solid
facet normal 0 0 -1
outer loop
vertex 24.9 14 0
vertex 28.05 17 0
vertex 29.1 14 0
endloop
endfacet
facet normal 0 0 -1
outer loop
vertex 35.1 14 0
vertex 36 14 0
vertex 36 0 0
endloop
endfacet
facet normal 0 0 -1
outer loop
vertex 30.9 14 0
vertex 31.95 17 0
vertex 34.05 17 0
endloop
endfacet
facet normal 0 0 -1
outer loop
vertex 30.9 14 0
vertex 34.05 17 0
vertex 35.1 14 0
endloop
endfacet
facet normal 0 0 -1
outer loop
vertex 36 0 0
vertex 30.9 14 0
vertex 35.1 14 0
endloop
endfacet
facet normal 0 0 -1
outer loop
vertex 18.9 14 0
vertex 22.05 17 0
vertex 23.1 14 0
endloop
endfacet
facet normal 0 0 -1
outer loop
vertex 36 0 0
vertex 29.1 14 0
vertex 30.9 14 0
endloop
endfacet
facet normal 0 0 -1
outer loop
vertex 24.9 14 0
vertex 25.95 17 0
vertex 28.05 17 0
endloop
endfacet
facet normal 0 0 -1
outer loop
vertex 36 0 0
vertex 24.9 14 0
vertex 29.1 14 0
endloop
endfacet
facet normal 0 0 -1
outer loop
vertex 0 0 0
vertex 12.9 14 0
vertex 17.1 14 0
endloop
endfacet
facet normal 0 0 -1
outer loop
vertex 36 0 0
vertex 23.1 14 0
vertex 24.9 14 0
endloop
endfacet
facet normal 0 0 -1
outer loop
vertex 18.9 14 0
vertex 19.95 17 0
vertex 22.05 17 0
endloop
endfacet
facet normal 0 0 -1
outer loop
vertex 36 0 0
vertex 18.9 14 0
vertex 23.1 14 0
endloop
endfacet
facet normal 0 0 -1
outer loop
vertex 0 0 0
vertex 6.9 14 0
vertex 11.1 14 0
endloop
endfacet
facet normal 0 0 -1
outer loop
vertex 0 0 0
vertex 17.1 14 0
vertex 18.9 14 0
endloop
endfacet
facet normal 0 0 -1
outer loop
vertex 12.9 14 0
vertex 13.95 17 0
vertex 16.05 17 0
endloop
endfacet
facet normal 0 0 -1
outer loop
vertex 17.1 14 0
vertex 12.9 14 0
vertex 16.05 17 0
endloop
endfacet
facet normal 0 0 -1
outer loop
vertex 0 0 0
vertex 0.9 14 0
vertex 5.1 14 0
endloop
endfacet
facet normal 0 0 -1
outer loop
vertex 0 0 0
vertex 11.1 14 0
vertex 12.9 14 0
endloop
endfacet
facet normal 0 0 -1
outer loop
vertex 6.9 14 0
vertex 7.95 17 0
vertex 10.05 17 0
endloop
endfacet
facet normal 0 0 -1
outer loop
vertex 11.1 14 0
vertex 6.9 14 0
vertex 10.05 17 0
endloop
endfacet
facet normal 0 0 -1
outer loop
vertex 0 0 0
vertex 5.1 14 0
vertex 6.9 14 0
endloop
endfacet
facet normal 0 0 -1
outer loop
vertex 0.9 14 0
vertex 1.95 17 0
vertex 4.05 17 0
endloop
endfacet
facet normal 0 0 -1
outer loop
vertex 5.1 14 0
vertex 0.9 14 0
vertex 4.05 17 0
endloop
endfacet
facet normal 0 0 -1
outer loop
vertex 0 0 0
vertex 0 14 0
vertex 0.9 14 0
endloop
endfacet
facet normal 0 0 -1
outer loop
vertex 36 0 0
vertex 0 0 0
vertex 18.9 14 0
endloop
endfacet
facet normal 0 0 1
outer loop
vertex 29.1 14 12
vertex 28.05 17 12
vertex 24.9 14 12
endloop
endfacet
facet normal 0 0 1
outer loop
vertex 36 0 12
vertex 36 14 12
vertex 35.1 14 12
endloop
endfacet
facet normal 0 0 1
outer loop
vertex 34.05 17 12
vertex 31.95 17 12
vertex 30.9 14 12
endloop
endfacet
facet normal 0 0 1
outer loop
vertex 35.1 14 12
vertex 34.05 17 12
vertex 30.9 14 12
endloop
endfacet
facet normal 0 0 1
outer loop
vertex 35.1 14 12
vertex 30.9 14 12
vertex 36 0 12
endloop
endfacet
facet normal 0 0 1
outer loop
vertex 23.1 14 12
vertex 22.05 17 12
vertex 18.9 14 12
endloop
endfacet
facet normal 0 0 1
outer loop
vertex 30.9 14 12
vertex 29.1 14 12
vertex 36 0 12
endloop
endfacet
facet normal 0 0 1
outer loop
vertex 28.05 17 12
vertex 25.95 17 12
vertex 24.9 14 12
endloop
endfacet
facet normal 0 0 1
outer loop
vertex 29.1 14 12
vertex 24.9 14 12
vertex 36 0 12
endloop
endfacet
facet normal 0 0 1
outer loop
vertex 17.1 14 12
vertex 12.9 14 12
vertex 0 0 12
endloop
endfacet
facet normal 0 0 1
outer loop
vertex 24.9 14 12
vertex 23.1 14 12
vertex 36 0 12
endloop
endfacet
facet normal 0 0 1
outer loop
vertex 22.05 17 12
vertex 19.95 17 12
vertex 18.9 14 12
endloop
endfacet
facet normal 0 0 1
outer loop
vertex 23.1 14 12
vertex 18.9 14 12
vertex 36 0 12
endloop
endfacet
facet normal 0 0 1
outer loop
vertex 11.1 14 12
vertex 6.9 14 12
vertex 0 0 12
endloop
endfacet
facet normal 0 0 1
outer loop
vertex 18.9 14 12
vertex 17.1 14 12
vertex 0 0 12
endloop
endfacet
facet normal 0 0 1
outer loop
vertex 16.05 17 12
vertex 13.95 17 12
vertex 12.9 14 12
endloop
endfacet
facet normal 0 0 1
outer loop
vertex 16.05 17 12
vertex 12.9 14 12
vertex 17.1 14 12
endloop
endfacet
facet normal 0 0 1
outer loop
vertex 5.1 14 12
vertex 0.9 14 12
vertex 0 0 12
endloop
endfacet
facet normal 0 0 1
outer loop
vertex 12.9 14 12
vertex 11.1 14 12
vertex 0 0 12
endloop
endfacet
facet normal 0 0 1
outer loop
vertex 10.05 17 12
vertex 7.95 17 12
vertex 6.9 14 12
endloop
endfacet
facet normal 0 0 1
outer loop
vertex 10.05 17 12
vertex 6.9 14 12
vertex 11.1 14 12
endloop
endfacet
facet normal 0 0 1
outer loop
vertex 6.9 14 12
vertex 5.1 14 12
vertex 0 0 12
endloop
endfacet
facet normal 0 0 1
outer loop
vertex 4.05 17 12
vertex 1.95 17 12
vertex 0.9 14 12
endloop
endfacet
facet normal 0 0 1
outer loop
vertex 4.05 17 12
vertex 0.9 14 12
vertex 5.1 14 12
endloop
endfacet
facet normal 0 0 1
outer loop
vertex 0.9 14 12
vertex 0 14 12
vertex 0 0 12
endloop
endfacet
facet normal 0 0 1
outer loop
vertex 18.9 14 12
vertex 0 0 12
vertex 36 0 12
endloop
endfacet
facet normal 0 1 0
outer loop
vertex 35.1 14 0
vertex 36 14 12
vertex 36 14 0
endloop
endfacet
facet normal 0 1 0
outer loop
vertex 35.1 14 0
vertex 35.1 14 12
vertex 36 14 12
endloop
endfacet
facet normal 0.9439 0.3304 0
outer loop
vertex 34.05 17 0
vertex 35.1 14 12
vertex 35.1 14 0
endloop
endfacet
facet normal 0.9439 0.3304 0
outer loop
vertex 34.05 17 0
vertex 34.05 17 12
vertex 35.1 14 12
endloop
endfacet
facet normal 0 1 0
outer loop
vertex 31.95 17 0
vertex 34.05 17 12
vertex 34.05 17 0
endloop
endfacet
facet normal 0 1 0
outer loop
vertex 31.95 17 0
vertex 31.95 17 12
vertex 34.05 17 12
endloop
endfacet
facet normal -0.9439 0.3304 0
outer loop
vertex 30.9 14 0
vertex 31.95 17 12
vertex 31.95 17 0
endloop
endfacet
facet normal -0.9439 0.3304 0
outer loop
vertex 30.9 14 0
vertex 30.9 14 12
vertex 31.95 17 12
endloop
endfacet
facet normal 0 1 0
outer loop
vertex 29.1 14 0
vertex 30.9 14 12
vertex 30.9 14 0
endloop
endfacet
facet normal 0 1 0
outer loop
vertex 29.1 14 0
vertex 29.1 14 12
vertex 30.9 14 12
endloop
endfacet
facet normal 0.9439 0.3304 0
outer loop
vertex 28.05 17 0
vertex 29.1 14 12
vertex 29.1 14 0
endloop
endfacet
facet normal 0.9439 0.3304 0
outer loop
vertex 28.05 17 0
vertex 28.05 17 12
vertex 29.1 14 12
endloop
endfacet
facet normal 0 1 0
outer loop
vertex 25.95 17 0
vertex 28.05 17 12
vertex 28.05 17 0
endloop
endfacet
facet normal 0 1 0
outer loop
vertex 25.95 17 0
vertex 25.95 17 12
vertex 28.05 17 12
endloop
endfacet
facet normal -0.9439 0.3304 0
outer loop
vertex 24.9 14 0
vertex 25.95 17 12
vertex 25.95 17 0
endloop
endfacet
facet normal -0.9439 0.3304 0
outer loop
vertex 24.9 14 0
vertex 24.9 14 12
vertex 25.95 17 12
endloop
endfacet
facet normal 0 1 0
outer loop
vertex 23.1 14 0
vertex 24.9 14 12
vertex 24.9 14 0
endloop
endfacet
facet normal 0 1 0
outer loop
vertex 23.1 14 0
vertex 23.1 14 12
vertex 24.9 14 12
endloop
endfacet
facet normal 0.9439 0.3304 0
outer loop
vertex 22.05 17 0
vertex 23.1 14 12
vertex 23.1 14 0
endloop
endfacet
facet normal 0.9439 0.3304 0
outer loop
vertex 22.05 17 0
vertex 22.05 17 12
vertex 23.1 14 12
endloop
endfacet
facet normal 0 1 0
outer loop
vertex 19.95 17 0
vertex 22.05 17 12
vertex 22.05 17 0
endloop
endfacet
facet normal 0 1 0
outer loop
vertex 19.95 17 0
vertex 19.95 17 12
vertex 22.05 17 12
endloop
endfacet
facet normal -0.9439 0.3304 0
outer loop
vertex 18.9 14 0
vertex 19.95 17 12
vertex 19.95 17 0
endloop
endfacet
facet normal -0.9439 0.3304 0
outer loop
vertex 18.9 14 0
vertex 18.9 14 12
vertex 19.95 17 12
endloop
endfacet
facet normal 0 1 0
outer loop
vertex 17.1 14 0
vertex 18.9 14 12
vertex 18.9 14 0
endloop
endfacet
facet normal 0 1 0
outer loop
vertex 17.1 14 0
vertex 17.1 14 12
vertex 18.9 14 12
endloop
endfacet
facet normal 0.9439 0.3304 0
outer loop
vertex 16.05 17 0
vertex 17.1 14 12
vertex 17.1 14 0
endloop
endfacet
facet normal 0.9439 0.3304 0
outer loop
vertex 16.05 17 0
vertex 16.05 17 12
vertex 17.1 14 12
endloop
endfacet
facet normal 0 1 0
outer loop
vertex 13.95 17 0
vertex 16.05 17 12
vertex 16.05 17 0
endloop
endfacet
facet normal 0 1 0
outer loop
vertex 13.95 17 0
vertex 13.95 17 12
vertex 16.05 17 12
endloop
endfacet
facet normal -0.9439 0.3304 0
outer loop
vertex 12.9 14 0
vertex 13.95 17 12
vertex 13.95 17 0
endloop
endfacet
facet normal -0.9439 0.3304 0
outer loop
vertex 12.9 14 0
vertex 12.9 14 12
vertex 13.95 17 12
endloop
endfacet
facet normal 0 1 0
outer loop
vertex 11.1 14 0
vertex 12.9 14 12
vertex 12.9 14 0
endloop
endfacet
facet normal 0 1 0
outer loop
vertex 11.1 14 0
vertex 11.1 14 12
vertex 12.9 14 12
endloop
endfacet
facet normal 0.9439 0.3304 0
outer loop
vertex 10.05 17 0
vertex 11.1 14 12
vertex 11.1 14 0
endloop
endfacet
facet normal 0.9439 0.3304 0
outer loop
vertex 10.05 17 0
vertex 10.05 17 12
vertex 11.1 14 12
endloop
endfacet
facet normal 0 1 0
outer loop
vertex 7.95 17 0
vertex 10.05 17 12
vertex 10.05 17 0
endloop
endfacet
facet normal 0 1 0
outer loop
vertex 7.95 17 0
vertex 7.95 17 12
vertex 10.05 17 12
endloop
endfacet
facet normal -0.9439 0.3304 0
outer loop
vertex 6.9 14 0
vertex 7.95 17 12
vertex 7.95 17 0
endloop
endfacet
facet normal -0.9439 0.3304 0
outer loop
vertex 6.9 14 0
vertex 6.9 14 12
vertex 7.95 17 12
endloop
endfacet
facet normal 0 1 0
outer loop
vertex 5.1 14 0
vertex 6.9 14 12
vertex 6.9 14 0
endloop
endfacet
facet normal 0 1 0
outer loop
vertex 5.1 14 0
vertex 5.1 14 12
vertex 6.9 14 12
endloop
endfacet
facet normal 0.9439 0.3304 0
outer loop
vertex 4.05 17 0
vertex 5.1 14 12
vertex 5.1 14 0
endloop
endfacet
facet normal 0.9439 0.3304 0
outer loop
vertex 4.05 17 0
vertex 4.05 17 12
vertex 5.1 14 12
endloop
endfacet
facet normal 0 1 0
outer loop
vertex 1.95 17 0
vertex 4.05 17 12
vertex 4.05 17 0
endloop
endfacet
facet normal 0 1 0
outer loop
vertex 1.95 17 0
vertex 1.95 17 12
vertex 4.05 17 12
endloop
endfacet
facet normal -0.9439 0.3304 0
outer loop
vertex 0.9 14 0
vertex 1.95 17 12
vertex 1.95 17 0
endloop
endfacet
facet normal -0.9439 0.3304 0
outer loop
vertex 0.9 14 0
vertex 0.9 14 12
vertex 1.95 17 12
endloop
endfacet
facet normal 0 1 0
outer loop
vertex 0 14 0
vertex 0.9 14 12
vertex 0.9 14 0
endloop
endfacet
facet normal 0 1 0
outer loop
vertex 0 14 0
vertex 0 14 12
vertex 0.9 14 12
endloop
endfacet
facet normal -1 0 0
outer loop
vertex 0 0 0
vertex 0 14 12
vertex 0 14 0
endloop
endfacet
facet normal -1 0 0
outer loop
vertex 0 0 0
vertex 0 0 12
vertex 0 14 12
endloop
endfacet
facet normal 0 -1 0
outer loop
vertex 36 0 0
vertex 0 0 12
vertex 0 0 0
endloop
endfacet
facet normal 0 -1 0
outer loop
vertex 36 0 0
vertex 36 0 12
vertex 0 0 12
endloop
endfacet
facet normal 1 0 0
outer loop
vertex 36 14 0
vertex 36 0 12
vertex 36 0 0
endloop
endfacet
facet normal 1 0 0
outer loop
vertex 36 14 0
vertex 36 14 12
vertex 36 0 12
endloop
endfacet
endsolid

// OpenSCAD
$fn = 32;

// ----------------------------------------------------------------------
// Gear rack: 6 teeth, pitch 6 mm
// ----------------------------------------------------------------------

// --- parameters (mm) ---
teeth = 6;                // number of teeth
pitch = 6;                // tooth pitch, X
root_w = 4.2;             // tooth width at the root
tip_w = 2.1;              // tooth width at the tip
base_h = 14;              // rack body height, Y
tooth_h = 3;              // tooth height above the body
plate_t = 12;             // rack width, Z (extrusion height)

rack_l = teeth * pitch;  // overall length
total_h = base_h + tooth_h;  // overall height

profile = [[0, 0], [36, 0], [36, 14], [35.1, 14], [34.05, 17], [31.95, 17], [30.9, 14], [29.1, 14], [28.05, 17], [25.95, 17], [24.9, 14], [23.1, 14], [22.05, 17], [19.95, 17], [18.9, 14], [17.1, 14], [16.05, 17], [13.95, 17], [12.9, 14], [11.1, 14], [10.05, 17], [7.95, 17], [6.9, 14], [5.1, 14], [4.05, 17], [1.95, 17], [0.9, 14], [0, 14]];  // primary outline, 28 points, counter clockwise

// --- the one profile operation ---
linear_extrude(height = plate_t) polygon(points = profile);
